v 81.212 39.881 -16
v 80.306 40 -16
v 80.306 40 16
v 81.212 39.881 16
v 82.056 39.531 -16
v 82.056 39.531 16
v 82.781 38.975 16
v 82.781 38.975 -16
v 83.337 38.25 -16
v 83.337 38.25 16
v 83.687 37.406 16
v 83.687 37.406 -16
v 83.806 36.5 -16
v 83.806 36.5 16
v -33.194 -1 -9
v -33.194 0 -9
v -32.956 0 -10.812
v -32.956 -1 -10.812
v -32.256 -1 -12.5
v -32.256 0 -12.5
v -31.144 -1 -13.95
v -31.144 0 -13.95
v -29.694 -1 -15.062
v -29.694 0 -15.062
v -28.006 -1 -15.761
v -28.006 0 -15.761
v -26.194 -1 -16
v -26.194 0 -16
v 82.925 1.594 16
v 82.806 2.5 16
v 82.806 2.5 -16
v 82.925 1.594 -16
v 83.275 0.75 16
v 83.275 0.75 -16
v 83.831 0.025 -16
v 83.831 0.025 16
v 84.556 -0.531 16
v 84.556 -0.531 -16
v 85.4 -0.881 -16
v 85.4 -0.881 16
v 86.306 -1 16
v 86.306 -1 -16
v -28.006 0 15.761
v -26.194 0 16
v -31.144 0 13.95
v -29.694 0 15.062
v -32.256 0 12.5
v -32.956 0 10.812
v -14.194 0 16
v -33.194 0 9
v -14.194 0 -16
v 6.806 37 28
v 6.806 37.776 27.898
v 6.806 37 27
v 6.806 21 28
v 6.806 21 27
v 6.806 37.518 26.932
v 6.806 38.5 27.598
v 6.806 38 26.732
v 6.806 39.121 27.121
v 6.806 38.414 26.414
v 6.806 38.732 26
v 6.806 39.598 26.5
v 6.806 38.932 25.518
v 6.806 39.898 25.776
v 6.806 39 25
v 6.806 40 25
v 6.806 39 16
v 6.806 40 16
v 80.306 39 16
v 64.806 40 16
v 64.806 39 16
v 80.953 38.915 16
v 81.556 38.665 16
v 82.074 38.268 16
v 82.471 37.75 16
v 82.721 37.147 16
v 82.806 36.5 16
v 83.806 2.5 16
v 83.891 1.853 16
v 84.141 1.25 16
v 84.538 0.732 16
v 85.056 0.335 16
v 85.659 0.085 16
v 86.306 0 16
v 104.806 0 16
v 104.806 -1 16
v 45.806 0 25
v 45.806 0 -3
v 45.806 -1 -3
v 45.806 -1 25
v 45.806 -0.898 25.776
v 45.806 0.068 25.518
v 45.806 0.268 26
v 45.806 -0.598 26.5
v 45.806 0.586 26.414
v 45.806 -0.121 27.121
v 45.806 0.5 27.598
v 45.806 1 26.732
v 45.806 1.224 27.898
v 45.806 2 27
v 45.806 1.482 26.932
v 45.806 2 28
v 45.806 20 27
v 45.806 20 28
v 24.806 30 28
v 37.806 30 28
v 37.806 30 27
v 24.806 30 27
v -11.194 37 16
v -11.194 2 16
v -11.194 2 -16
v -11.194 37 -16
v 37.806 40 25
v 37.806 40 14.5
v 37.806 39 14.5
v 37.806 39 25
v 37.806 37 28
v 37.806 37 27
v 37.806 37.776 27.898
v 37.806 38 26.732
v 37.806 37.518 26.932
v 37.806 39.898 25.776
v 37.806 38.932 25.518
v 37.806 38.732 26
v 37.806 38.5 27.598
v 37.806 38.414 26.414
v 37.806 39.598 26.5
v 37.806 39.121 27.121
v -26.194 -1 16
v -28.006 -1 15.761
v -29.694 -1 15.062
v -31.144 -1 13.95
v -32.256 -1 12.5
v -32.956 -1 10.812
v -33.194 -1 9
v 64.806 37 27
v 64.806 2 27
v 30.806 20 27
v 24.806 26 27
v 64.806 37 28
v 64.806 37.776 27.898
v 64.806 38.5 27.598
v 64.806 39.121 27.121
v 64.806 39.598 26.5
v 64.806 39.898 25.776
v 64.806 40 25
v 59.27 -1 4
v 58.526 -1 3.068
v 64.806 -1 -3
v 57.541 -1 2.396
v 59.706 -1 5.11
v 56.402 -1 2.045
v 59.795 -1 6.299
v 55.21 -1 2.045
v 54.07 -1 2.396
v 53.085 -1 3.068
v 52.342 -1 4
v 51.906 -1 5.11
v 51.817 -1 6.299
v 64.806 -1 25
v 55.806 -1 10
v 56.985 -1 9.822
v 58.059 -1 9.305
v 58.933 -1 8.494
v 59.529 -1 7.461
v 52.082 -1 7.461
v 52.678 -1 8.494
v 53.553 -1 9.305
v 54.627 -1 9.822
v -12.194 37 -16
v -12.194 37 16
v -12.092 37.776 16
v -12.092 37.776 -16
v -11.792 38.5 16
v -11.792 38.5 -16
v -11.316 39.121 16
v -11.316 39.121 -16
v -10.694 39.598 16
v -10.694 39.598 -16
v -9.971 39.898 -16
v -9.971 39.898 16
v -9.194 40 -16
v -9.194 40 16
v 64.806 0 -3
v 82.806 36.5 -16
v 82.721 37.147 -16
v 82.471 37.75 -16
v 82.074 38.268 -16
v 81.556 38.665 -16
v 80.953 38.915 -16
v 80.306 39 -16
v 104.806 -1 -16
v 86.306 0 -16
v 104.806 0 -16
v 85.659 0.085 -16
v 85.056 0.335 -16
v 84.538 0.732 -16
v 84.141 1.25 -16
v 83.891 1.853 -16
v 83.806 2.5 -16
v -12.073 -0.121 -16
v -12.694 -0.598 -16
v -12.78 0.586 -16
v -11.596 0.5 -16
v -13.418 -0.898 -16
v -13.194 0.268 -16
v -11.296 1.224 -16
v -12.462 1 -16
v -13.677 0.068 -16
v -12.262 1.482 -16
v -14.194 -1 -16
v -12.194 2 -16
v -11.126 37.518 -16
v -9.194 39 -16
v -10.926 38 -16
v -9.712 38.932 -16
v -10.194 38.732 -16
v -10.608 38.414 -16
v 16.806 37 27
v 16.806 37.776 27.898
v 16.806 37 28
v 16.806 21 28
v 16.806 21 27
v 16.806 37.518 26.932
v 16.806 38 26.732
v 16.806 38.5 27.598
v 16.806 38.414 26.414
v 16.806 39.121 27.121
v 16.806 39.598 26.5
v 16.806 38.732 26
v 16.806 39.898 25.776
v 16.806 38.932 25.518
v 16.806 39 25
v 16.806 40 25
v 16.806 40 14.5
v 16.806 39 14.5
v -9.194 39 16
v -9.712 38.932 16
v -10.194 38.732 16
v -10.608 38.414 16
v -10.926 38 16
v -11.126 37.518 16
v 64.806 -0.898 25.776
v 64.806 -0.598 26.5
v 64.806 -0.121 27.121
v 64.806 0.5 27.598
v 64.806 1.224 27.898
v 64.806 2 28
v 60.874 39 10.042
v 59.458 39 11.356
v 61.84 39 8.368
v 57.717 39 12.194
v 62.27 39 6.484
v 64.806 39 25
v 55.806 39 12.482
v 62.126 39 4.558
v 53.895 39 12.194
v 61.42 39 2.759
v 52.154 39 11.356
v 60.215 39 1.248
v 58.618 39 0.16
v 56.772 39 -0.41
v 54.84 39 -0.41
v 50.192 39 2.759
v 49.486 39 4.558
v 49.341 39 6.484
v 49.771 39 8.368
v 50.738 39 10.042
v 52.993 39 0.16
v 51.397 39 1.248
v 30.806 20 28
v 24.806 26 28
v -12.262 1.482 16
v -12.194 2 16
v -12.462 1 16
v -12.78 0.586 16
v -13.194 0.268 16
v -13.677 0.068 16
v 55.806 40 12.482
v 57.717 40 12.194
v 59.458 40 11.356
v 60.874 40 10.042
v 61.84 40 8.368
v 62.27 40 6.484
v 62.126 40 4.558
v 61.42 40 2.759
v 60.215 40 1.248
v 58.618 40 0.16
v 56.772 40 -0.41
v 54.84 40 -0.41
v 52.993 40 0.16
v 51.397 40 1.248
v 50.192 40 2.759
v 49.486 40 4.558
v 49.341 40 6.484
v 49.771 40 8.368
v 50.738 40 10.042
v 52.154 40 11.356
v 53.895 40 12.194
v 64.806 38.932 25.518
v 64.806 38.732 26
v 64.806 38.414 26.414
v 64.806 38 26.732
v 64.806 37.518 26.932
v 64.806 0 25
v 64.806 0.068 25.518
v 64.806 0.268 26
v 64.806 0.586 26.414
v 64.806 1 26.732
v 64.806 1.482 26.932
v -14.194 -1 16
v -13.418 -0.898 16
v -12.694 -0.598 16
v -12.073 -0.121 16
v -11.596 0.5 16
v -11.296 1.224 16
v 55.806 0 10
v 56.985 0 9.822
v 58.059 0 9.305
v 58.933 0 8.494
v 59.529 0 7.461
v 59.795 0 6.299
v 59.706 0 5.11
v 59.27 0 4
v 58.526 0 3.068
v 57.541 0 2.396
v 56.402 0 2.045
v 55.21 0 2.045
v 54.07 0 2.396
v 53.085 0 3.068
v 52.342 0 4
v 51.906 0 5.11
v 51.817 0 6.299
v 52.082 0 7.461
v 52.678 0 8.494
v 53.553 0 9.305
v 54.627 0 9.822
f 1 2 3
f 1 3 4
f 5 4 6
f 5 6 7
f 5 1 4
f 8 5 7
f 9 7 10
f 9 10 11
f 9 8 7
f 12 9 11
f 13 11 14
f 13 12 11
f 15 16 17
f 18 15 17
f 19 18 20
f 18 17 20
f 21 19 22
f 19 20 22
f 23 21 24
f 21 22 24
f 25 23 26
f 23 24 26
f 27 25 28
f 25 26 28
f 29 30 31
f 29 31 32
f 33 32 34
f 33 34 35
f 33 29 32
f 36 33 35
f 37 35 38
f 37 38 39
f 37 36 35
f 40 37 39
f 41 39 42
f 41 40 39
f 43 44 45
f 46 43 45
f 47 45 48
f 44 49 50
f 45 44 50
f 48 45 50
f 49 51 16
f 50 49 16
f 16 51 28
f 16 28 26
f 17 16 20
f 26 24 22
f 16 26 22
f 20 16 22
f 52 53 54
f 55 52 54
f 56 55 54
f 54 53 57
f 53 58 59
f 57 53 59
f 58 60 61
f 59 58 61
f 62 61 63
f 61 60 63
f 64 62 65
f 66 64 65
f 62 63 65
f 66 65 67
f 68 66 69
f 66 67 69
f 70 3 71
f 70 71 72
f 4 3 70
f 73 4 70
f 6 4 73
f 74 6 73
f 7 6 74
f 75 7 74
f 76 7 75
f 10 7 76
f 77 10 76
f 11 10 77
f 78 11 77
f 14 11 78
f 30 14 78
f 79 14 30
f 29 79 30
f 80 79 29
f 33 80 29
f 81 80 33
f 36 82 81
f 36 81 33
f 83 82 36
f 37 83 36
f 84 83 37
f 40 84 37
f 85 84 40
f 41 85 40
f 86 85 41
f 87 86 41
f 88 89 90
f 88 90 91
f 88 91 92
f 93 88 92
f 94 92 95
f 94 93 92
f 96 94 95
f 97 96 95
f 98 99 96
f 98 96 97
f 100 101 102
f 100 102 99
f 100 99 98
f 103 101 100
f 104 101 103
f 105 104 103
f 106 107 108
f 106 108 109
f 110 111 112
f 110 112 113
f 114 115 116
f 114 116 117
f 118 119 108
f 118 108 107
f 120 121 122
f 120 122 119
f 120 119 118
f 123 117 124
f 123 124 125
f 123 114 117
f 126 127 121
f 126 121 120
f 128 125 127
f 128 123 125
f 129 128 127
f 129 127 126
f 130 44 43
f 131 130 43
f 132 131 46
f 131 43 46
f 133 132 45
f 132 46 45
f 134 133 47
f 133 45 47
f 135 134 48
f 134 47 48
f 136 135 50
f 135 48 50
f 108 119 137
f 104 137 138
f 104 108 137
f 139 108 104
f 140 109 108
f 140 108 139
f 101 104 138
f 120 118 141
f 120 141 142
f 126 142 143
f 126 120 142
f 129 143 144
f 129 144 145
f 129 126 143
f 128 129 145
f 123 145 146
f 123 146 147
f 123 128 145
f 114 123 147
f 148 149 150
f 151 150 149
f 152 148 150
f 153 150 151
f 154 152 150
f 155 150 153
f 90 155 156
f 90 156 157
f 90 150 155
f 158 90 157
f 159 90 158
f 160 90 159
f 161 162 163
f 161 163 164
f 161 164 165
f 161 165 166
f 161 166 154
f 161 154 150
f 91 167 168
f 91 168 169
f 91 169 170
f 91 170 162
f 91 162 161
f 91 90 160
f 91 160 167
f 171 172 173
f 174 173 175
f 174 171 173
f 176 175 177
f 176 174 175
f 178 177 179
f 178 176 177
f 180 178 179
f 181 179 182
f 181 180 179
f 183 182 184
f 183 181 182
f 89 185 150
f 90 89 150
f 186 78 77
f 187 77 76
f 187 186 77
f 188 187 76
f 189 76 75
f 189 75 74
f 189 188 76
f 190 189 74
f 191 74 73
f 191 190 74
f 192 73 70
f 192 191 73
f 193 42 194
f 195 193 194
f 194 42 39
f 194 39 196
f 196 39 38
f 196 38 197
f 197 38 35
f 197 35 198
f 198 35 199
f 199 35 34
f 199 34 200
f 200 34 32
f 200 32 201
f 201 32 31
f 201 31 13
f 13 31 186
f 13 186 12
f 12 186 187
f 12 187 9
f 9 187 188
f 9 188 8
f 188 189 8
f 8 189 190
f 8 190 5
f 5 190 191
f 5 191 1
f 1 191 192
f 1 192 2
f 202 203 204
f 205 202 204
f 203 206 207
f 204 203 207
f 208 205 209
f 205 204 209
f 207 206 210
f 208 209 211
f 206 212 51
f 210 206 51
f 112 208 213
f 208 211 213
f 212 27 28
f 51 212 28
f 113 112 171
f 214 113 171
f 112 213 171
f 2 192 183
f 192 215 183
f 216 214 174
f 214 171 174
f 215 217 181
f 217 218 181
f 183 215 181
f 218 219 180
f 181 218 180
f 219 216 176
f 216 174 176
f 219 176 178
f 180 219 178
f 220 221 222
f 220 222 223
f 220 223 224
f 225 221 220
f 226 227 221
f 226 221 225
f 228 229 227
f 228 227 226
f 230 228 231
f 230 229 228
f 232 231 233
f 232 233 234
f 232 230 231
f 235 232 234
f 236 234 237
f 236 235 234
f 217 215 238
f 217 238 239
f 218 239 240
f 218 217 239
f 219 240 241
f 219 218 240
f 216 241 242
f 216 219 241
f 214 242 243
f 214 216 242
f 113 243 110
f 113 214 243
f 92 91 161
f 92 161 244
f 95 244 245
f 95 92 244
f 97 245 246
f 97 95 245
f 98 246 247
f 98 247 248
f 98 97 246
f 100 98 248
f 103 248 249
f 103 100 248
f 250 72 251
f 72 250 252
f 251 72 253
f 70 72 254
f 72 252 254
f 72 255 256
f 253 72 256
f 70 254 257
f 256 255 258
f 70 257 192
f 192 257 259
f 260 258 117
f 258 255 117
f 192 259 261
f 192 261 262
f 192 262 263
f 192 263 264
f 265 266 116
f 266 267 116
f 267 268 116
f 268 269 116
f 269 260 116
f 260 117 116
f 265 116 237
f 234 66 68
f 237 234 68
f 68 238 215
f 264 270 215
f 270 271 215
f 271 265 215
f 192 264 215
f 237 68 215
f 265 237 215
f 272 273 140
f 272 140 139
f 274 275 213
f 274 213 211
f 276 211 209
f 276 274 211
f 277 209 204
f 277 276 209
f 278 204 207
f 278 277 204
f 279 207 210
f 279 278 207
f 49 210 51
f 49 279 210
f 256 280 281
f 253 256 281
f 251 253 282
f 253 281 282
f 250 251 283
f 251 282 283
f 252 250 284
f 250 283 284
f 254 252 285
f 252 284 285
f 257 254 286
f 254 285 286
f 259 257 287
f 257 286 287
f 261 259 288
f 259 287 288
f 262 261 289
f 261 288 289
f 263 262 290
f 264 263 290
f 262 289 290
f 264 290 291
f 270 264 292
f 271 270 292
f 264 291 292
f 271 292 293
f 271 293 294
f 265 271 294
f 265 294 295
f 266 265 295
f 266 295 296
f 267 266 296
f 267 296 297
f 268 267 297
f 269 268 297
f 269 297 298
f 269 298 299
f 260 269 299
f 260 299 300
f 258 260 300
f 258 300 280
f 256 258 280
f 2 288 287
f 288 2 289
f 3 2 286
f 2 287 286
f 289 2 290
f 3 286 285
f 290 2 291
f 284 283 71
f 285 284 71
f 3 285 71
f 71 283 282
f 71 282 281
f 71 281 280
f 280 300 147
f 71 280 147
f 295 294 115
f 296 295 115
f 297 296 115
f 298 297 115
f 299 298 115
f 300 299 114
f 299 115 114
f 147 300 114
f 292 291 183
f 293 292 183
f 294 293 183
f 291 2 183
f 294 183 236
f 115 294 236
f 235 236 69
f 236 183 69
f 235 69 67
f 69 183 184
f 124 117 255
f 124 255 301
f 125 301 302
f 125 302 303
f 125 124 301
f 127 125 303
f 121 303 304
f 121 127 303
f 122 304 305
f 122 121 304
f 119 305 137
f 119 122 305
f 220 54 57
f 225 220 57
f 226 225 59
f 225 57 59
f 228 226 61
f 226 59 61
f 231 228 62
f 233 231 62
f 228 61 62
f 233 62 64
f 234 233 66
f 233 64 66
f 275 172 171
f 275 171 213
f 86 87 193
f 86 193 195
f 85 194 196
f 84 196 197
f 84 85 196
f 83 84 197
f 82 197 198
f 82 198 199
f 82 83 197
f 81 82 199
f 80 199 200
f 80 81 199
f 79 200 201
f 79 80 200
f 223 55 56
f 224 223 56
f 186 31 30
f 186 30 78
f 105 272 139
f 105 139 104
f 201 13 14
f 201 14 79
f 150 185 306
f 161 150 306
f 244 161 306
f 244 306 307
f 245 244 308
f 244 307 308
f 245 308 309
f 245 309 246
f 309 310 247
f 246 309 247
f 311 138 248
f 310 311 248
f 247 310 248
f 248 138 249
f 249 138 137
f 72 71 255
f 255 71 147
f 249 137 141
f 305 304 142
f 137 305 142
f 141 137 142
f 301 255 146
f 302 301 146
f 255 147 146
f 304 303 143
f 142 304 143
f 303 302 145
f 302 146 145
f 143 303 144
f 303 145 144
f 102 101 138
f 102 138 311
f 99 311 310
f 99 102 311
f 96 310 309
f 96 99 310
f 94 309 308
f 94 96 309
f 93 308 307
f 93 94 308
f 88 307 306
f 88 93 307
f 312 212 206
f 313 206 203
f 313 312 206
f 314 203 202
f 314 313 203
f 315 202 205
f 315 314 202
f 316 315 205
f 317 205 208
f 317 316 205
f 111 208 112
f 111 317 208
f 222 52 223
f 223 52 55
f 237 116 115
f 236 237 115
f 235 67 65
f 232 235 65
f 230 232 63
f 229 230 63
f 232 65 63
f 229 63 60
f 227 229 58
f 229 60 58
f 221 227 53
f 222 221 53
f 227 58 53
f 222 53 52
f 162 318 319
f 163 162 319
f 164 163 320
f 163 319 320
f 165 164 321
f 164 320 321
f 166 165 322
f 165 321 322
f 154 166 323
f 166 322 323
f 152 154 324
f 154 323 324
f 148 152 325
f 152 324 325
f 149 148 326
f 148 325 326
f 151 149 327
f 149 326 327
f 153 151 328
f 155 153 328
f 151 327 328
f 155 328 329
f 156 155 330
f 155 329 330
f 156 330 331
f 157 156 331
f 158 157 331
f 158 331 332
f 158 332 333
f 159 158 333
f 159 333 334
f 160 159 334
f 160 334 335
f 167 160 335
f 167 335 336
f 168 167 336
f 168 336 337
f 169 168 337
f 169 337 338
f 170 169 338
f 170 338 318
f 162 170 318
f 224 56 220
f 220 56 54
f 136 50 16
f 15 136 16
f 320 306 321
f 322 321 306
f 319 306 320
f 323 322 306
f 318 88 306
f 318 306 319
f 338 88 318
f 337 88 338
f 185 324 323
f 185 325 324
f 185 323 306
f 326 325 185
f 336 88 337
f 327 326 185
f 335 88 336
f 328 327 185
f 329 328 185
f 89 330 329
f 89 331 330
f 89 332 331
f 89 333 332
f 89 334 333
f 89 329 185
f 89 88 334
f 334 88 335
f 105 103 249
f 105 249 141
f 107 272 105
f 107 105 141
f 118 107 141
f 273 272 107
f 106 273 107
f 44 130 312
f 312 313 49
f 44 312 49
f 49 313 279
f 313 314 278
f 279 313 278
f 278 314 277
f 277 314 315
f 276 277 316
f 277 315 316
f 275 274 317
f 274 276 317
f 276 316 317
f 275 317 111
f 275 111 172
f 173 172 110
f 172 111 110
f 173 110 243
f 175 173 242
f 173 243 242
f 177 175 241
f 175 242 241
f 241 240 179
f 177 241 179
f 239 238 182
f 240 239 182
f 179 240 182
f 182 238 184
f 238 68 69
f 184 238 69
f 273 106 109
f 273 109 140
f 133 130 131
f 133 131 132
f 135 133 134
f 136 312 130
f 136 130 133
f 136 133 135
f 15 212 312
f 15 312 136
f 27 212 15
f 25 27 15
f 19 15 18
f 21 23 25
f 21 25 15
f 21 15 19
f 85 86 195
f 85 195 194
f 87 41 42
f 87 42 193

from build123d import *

# Parameters (mm, degrees)
BASE_FLANGE1_DEPTH           = 1
EDGE_FLANGE2_STRIP_W         = 8
EDGE_FLANGE2_STRIP_H         = 1
EDGE_FLANGE2_STRIP_CUT_DEPTH = 32
EDGE_FLANGE2_DEPTH           = 32
EDGE_FLANGE3_STRIP_W         = 8
EDGE_FLANGE3_STRIP_H         = 1
EDGE_FLANGE3_STRIP_CUT_DEPTH = 32
EDGE_FLANGE3_DEPTH           = 32
BASE_FLANGE2_DEPTH           = 10
SKETCH28_W                   = 30.5
SKETCH28_H                   = 1
BASE_FLANGE3_DEPTH           = 21
BASE_FLANGE4_DEPTH           = 8
TAB1_DEPTH                   = 1
BASE_FLANGE5_DEPTH           = 19
SKETCH41_W                   = 32
SKETCH41_H                   = 1
BASE_FLANGE6_DEPTH           = 19
EDGE_FLANGE4_STRIP_W         = 9
EDGE_FLANGE4_STRIP_H         = 1
EDGE_FLANGE4_STRIP_CUT_DEPTH = 32
EDGE_FLANGE4_DEPTH           = 32
EDGE_FLANGE5_STRIP_W         = 9
EDGE_FLANGE5_STRIP_H         = 1
EDGE_FLANGE5_STRIP_CUT_DEPTH = 32
EDGE_FLANGE5_DEPTH           = 32
SKETCH52_R                   = 6.482448702
CUT_EXTRUDE1_DEPTH           = 10
SKETCH53_R                   = 4
CUT_EXTRUDE2_DEPTH           = 10


# Read off the part's stored shape, not the designer's step: Base-Flange2
# Sheet-metal steps are written as plain solids
with BuildPart() as part:
    # Sketch1 → Base-Flange1 (new body)
    with BuildSketch(Plane(origin=(0, 0, 0), x_dir=(1, 0, 0), z_dir=(0, 1, 0))):
        with BuildLine():
            Line((-33.194191811, -9), (-33.194191811, 9))
            ThreePointArc((-33.194191811, 9), (-31.14393928, 13.949747468), (-26.194191811, 16))
            Line((-26.194191811, 16), (-11.194191811, 16))
            Line((-11.194191811, 16), (-11.194191811, -16))
            Line((-11.194191811, -16), (-26.194191811, -16))
            ThreePointArc((-26.194191811, -16), (-31.14393928, -13.949747468), (-33.194191811, -9))
        make_face()
    extrude(amount=-BASE_FLANGE1_DEPTH)

    # Edge-Flange2 strip (across the edge) → Edge-Flange2 strip cut (cut)
    with BuildSketch(Plane(origin=(-11.194191811, 0, 16), x_dir=(-1, 0, 0), z_dir=(0, 0, -1))):
        with Locations((-1, -0.5)):
            Rectangle(EDGE_FLANGE2_STRIP_W, EDGE_FLANGE2_STRIP_H)
    extrude(amount=EDGE_FLANGE2_STRIP_CUT_DEPTH, mode=Mode.SUBTRACT)

    # Edge-Flange2 section (across the edge) → Edge-Flange2 (add)
    with BuildSketch(Plane(origin=(-11.194191811, 0, 16), x_dir=(-1, 0, 0), z_dir=(0, 0, -1))):
        with BuildLine():
            Line((0, 2), (0, 40))
            Line((0, 40), (1, 40))
            Line((1, 40), (1, 2))
            ThreePointArc((1, 2), (1.585786438, 0.585786438), (3, 0))
            Line((3, 0), (3, -1))
            ThreePointArc((3, -1), (0.878679656, -0.121320344), (0, 2))
        make_face()
    extrude(amount=EDGE_FLANGE2_DEPTH)

    # Edge-Flange3 strip (across the edge) → Edge-Flange3 strip cut (cut)
    with BuildSketch(Plane(origin=(-11.194191811, 40, -16), x_dir=(0, -1, 0), z_dir=(0, 0, 1))):
        with Locations((-1, -0.5)):
            Rectangle(EDGE_FLANGE3_STRIP_W, EDGE_FLANGE3_STRIP_H)
    extrude(amount=EDGE_FLANGE3_STRIP_CUT_DEPTH, mode=Mode.SUBTRACT)

    # Edge-Flange3 section (across the edge) → Edge-Flange3 (add)
    with BuildSketch(Plane(origin=(-11.194191811, 40, -16), x_dir=(0, -1, 0), z_dir=(0, 0, 1))):
        with BuildLine():
            Line((0, 2), (0, 18))
            Line((0, 18), (1, 18))
            Line((1, 18), (1, 2))
            ThreePointArc((1, 2), (1.585786438, 0.585786438), (3, 0))
            Line((3, 0), (3, -1))
            ThreePointArc((3, -1), (0.878679656, -0.121320344), (0, 2))
        make_face()
    extrude(amount=EDGE_FLANGE3_DEPTH)


with BuildPart() as body_2:
    # Base-Flange2 outline → Base-Flange2 (new body)
    with BuildSketch(Plane(origin=(6.805808189, 0, 0), x_dir=(0, 0, -1), z_dir=(1, 0, 0))):
        with BuildLine():
            Line((-28, 37), (-28, 21))
            Line((-28, 21), (-27, 21))
            Line((-27, 21), (-27, 37))
            ThreePointArc((-27, 37), (-26.414213562, 38.414213562), (-25, 39))
            Line((-25, 39), (16, 39))
            Line((16, 39), (16, 40))
            Line((16, 40), (-25, 40))
            ThreePointArc((-25, 40), (-27.121320344, 39.121320344), (-28, 37))
        make_face()
    extrude(amount=BASE_FLANGE2_DEPTH)


with BuildPart() as part_1:
    add(part.part)

    # Combine1: union body 2
    add(body_2.part)


with BuildPart() as body_2_2:
    # Sketch28 → Base-Flange3 (new body)
    with BuildSketch(Plane(origin=(16.805808189, 0, 0), x_dir=(0, 0, -1), z_dir=(1, 0, 0))):
        with Locations((0.75, 39.5)):
            Rectangle(SKETCH28_W, SKETCH28_H)
    extrude(amount=BASE_FLANGE3_DEPTH)


with BuildPart() as body_3:
    # Sketch31 → Base-Flange4 (new body)
    with BuildSketch(Plane(origin=(37.805808189, 0, 0), x_dir=(0, 0, -1), z_dir=(1, 0, 0))):
        with BuildLine():
            Line((16, 39), (-25, 39))
            ThreePointArc((-25, 39), (-26.414213562, 38.414213562), (-27, 37))
            Line((-27, 37), (-27, 30))
            Line((-27, 30), (-28, 30))
            Line((-28, 30), (-28, 37))
            ThreePointArc((-28, 37), (-27.121320344, 39.121320344), (-25, 40))
            Line((-25, 40), (16, 40))
            Line((16, 40), (16, 39))
        make_face()
    extrude(amount=BASE_FLANGE4_DEPTH)

    # Sketch34 → Tab1 (add)
    with BuildSketch(Plane.XY.offset(28)):
        Polygon((45.805808189, 30), (24.805808189, 30), (24.805808189, 26), (30.805808189, 20), (45.805808189, 20), align=None)
    extrude(amount=-TAB1_DEPTH)


with BuildPart() as body_4:
    # Sketch38 → Base-Flange5 (new body)
    with BuildSketch(Plane(origin=(45.805808189, 0, 0), x_dir=(0, 0, -1), z_dir=(1, 0, 0))):
        with BuildLine():
            Line((16, 39), (-25, 39))
            ThreePointArc((-25, 39), (-26.414213562, 38.414213562), (-27, 37))
            Line((-27, 37), (-27, 2))
            ThreePointArc((-27, 2), (-26.414213562, 0.585786438), (-25, 0))
            Line((-25, 0), (3, 0))
            Line((3, 0), (3, -1))
            Line((3, -1), (-25, -1))
            ThreePointArc((-25, -1), (-27.121320344, -0.121320344), (-28, 2))
            Line((-28, 2), (-28, 37))
            ThreePointArc((-28, 37), (-27.121320344, 39.121320344), (-25, 40))
            Line((-25, 40), (16, 40))
            Line((16, 40), (16, 39))
        make_face()
    extrude(amount=BASE_FLANGE5_DEPTH)


with BuildPart() as body_5:
    # Sketch41 → Base-Flange6 (new body)
    with BuildSketch(Plane(origin=(64.805808189, 0, 0), x_dir=(0, 0, -1), z_dir=(1, 0, 0))):
        with Locations((0, 39.5)):
            Rectangle(SKETCH41_W, SKETCH41_H)
    extrude(amount=BASE_FLANGE6_DEPTH)

    # Edge-Flange4 strip (across the edge) → Edge-Flange4 strip cut (cut)
    with BuildSketch(Plane(origin=(83.805808189, 39, -16), x_dir=(-1, 0, 0), z_dir=(0, 0, 1))):
        with Locations((-1, -0.5)):
            Rectangle(EDGE_FLANGE4_STRIP_W, EDGE_FLANGE4_STRIP_H)
    extrude(amount=EDGE_FLANGE4_STRIP_CUT_DEPTH, mode=Mode.SUBTRACT)

    # Edge-Flange4 section (across the edge) → Edge-Flange4 (add)
    with BuildSketch(Plane(origin=(83.805808189, 39, -16), x_dir=(-1, 0, 0), z_dir=(0, 0, 1))):
        with BuildLine():
            Line((0, 2.5), (0, 40))
            Line((0, 40), (1, 40))
            Line((1, 40), (1, 2.5))
            ThreePointArc((1, 2.5), (1.732233047, 0.732233047), (3.5, 0))
            Line((3.5, 0), (3.5, -1))
            ThreePointArc((3.5, -1), (1.025126266, 0.025126266), (0, 2.5))
        make_face()
    extrude(amount=EDGE_FLANGE4_DEPTH)

    # Edge-Flange5 strip (across the edge) → Edge-Flange5 strip cut (cut)
    with BuildSketch(Plane(origin=(83.805808189, -1, 16), x_dir=(0, 1, 0), z_dir=(0, 0, -1))):
        with Locations((-1, -0.5)):
            Rectangle(EDGE_FLANGE5_STRIP_W, EDGE_FLANGE5_STRIP_H)
    extrude(amount=EDGE_FLANGE5_STRIP_CUT_DEPTH, mode=Mode.SUBTRACT)

    # Edge-Flange5 section (across the edge) → Edge-Flange5 (add)
    with BuildSketch(Plane(origin=(83.805808189, -1, 16), x_dir=(0, 1, 0), z_dir=(0, 0, -1))):
        with BuildLine():
            Line((0, 2.5), (0, 21))
            Line((0, 21), (1, 21))
            Line((1, 21), (1, 2.5))
            ThreePointArc((1, 2.5), (1.732233047, 0.732233047), (3.5, 0))
            Line((3.5, 0), (3.5, -1))
            ThreePointArc((3.5, -1), (1.025126266, 0.025126266), (0, 2.5))
        make_face()
    extrude(amount=EDGE_FLANGE5_DEPTH)


with BuildPart() as body_2_2_1:
    add(body_2_2.part)

    # Combine2: union body 3, body 4, body 5, part
    add(body_3.part)
    add(body_4.part)
    add(body_5.part)
    add(part_1.part)

    # Sketch52 → Cut-Extrude1 (cut)
    with BuildSketch(Plane(origin=(0, 40, 0), x_dir=(1, 0, 0), z_dir=(0, 1, 0))):
        with Locations(Location((55.805808189, -6, 0), (0, 0, 270))):
            Circle(SKETCH52_R)
    extrude(amount=-CUT_EXTRUDE1_DEPTH, mode=Mode.SUBTRACT)

    # Sketch53 → Cut-Extrude2 (cut)
    with BuildSketch(Plane(origin=(0, 0, 0), x_dir=(1, 0, 0), z_dir=(0, 1, 0))):
        with Locations(Location((55.805808189, -6, 0), (0, 0, 270))):
            Circle(SKETCH53_R)
    extrude(amount=-CUT_EXTRUDE2_DEPTH, mode=Mode.SUBTRACT)


solid = body_2_2_1.part
